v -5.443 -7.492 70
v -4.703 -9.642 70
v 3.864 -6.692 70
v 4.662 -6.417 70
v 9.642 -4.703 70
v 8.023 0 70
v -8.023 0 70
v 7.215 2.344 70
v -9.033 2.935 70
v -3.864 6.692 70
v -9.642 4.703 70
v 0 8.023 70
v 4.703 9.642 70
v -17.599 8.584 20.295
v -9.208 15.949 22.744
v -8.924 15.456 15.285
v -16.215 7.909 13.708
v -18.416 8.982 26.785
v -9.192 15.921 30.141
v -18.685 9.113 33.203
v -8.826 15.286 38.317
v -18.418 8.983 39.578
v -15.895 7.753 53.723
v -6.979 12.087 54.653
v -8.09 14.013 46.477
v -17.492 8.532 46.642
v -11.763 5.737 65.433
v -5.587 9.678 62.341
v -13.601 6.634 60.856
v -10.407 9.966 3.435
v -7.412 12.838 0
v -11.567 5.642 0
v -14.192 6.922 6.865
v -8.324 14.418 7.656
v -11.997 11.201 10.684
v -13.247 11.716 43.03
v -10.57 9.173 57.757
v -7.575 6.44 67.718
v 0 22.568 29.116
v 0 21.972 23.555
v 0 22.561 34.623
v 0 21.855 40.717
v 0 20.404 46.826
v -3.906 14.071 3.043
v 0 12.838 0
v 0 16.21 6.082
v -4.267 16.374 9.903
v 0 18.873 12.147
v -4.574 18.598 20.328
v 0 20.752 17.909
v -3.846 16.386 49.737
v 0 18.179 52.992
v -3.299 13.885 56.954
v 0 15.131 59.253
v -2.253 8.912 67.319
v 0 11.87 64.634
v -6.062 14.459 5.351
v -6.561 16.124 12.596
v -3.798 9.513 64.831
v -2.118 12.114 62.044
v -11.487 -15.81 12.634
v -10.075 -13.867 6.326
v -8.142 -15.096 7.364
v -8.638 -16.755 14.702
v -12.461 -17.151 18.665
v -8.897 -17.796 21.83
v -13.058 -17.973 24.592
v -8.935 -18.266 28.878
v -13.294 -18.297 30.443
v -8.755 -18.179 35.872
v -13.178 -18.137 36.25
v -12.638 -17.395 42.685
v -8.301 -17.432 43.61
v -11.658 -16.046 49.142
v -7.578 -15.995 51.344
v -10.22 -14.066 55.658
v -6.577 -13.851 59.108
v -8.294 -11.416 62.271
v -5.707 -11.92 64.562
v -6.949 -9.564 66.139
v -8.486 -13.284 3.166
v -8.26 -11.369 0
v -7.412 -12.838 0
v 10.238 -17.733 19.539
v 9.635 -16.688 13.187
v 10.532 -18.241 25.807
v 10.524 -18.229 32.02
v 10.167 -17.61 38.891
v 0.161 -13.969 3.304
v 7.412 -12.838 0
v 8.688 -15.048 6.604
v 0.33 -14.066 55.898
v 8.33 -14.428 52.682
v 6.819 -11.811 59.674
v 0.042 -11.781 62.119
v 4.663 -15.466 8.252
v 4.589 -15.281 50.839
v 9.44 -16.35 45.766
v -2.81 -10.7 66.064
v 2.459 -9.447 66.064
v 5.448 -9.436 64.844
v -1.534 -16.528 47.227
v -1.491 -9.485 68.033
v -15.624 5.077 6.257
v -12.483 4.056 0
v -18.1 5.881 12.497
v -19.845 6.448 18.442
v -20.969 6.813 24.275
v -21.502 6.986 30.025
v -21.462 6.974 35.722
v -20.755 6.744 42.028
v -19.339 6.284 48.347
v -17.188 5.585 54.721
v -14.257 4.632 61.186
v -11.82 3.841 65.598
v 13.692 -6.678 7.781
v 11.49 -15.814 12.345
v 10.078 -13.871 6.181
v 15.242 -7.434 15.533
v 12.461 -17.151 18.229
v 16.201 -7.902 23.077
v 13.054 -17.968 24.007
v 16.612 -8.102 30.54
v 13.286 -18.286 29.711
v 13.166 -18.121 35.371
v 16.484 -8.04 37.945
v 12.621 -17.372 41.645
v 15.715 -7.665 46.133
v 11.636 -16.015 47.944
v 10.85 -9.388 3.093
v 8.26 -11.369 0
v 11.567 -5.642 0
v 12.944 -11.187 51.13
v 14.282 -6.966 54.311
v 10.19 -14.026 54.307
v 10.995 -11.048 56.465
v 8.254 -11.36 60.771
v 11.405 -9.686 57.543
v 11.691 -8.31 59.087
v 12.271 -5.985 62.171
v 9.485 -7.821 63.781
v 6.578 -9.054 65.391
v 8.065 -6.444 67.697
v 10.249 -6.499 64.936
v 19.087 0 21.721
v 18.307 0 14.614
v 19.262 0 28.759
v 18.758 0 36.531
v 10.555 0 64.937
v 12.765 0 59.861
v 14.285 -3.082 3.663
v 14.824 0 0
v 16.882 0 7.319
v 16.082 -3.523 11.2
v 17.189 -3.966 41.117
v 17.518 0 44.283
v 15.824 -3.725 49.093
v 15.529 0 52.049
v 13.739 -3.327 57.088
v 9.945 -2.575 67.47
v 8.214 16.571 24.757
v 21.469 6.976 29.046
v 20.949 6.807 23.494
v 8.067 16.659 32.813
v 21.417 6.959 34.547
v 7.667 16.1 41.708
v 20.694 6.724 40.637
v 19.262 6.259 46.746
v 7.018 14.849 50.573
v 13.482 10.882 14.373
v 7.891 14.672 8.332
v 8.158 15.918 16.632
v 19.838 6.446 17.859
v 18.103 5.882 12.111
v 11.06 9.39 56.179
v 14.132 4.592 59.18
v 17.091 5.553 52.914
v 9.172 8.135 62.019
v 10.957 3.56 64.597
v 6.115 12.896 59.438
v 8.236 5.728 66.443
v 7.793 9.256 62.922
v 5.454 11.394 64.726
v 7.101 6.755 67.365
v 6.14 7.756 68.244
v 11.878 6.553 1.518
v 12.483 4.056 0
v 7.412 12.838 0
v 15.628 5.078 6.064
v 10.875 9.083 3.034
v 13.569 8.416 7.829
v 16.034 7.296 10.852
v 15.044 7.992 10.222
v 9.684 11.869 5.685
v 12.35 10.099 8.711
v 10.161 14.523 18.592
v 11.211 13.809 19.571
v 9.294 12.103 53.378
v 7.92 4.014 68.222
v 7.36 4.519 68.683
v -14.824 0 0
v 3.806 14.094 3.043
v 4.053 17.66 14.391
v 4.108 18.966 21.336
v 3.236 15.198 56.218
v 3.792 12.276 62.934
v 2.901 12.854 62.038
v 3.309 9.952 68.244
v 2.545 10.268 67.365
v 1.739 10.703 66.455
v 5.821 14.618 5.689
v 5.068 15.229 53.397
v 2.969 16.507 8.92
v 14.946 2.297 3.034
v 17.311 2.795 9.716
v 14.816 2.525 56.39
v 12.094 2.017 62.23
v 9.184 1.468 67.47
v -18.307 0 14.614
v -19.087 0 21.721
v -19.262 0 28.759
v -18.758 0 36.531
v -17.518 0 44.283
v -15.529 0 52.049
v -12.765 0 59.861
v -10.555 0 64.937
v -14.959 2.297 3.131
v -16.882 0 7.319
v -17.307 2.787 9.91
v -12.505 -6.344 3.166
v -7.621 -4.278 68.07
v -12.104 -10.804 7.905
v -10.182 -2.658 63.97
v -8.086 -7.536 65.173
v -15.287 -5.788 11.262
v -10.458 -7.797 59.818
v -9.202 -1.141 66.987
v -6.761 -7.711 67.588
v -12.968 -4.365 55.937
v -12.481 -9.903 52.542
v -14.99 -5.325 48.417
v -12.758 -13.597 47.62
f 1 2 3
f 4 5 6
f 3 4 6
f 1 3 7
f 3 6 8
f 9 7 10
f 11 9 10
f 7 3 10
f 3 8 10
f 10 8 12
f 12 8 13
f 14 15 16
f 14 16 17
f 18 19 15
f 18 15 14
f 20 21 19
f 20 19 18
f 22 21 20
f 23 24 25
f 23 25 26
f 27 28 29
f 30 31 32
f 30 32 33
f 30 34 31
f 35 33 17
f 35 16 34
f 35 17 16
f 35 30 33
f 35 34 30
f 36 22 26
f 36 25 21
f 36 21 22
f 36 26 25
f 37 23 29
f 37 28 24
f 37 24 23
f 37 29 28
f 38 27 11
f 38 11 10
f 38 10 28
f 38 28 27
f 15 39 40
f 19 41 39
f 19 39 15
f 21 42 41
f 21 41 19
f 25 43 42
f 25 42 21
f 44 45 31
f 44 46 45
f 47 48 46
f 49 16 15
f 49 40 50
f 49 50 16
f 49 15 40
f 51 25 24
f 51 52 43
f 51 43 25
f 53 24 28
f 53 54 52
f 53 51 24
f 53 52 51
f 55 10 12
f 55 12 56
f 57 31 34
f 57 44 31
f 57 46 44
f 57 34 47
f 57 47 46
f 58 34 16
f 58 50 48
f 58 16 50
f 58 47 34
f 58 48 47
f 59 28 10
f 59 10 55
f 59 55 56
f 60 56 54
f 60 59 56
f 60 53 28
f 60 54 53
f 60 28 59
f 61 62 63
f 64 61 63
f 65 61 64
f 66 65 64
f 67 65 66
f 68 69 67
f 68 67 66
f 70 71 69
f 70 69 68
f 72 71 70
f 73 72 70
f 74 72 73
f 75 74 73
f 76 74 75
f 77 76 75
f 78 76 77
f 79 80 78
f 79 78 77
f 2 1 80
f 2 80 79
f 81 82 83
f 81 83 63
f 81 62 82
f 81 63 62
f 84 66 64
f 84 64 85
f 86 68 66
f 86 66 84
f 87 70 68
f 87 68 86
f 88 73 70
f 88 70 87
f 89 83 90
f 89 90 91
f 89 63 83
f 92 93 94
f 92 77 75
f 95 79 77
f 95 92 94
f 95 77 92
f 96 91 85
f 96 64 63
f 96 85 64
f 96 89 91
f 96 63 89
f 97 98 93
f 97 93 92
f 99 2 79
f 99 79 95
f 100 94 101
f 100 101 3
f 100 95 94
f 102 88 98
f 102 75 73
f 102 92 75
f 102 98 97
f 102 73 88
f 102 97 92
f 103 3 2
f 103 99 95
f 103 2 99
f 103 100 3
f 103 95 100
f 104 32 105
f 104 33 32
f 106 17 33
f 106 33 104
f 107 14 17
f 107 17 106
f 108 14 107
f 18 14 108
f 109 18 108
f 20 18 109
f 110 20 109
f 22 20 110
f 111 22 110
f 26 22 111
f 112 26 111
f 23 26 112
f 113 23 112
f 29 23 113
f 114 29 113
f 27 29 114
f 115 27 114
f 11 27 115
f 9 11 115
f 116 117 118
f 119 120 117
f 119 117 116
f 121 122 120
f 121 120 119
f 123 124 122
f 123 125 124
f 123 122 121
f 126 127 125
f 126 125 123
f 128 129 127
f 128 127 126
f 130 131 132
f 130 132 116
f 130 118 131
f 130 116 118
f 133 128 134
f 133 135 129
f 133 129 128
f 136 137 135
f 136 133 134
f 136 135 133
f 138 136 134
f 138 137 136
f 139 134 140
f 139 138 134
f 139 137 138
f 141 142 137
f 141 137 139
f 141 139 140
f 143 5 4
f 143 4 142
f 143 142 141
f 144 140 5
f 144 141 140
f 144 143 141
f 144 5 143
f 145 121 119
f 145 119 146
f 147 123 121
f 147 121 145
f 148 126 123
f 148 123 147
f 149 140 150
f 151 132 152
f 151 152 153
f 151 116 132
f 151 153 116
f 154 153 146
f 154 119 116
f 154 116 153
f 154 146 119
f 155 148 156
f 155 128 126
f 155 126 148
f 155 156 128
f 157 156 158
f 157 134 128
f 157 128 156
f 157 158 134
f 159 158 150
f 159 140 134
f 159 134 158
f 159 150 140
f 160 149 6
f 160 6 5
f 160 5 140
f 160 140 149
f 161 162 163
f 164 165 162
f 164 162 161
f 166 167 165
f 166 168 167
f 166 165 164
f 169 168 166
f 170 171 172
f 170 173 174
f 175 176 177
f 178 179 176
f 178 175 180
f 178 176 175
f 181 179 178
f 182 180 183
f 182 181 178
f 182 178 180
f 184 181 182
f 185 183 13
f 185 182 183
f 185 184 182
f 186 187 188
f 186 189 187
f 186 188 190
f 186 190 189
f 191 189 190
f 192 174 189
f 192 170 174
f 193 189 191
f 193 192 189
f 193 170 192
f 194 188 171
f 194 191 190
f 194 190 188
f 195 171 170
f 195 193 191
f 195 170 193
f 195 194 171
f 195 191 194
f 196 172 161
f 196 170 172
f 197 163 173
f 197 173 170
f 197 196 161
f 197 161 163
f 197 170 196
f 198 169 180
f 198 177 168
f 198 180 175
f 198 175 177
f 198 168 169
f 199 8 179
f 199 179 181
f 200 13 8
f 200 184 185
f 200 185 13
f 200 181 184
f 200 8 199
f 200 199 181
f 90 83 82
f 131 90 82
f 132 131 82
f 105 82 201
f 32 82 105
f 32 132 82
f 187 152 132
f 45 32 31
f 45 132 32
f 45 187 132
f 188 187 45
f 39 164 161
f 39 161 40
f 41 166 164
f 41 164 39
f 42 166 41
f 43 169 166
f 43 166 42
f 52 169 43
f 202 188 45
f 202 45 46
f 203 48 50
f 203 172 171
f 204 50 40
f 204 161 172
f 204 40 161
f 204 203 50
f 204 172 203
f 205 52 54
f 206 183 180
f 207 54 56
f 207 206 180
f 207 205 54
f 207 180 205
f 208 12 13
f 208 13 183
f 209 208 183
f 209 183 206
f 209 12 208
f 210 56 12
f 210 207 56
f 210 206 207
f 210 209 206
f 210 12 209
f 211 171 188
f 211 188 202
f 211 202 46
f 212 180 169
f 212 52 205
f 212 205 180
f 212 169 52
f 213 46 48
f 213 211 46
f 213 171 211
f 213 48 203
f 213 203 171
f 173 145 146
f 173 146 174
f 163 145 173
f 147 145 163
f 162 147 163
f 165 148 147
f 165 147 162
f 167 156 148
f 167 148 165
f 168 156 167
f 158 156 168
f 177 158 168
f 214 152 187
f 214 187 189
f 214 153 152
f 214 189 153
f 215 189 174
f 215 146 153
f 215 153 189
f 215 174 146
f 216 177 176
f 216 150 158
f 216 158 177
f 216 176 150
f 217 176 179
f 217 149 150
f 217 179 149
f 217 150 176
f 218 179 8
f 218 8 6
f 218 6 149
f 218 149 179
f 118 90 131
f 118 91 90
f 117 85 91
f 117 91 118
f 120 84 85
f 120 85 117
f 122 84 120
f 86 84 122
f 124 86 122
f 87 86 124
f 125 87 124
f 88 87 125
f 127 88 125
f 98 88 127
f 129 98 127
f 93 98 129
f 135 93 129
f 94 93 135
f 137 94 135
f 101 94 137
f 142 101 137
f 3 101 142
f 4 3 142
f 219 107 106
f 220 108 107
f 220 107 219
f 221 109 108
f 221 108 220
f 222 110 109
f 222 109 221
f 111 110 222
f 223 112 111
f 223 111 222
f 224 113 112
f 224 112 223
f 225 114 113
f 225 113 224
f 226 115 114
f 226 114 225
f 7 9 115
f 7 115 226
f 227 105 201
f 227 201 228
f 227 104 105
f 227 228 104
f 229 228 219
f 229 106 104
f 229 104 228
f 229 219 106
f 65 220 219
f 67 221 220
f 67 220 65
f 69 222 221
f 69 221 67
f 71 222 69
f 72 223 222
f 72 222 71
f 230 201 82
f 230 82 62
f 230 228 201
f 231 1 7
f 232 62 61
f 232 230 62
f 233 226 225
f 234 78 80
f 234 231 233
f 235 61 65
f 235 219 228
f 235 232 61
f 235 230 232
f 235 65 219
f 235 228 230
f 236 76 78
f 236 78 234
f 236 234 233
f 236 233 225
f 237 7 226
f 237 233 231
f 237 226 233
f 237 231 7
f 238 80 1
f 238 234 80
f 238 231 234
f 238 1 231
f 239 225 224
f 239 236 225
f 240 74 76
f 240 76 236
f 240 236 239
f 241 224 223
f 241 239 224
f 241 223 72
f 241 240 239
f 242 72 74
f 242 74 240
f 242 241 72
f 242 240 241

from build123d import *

# Parameters (mm, degrees)
SKETCH002_W = 15.170966
SKETCH002_H = 15.170966


with BuildPart() as part:
    # Sketch → Loft section 0
    with BuildSketch(Plane.XY):
        Polygon((7.412128, -12.838183), (14.824257, 0), (7.412128, 12.838183), (-7.412128, 12.838183), (-14.824257, 0), (-7.412128, -12.838183), align=None)
    # Sketch001 → Loft section 1
    with BuildSketch(Plane.XY.offset(30)):
        Polygon((13.288204, -18.289643), (21.500765, 6.986022), (0, 22.607242), (-21.500765, 6.986022), (-13.288204, -18.289643), align=None)
    # Sketch002 → Loft section 2
    with BuildSketch(Plane(origin=(0, 0, 70), x_dir=(0.945519, 0.325568, 0), z_dir=(0, 0, 1))):
        Rectangle(SKETCH002_W, SKETCH002_H)
    loft()


solid = part.part
